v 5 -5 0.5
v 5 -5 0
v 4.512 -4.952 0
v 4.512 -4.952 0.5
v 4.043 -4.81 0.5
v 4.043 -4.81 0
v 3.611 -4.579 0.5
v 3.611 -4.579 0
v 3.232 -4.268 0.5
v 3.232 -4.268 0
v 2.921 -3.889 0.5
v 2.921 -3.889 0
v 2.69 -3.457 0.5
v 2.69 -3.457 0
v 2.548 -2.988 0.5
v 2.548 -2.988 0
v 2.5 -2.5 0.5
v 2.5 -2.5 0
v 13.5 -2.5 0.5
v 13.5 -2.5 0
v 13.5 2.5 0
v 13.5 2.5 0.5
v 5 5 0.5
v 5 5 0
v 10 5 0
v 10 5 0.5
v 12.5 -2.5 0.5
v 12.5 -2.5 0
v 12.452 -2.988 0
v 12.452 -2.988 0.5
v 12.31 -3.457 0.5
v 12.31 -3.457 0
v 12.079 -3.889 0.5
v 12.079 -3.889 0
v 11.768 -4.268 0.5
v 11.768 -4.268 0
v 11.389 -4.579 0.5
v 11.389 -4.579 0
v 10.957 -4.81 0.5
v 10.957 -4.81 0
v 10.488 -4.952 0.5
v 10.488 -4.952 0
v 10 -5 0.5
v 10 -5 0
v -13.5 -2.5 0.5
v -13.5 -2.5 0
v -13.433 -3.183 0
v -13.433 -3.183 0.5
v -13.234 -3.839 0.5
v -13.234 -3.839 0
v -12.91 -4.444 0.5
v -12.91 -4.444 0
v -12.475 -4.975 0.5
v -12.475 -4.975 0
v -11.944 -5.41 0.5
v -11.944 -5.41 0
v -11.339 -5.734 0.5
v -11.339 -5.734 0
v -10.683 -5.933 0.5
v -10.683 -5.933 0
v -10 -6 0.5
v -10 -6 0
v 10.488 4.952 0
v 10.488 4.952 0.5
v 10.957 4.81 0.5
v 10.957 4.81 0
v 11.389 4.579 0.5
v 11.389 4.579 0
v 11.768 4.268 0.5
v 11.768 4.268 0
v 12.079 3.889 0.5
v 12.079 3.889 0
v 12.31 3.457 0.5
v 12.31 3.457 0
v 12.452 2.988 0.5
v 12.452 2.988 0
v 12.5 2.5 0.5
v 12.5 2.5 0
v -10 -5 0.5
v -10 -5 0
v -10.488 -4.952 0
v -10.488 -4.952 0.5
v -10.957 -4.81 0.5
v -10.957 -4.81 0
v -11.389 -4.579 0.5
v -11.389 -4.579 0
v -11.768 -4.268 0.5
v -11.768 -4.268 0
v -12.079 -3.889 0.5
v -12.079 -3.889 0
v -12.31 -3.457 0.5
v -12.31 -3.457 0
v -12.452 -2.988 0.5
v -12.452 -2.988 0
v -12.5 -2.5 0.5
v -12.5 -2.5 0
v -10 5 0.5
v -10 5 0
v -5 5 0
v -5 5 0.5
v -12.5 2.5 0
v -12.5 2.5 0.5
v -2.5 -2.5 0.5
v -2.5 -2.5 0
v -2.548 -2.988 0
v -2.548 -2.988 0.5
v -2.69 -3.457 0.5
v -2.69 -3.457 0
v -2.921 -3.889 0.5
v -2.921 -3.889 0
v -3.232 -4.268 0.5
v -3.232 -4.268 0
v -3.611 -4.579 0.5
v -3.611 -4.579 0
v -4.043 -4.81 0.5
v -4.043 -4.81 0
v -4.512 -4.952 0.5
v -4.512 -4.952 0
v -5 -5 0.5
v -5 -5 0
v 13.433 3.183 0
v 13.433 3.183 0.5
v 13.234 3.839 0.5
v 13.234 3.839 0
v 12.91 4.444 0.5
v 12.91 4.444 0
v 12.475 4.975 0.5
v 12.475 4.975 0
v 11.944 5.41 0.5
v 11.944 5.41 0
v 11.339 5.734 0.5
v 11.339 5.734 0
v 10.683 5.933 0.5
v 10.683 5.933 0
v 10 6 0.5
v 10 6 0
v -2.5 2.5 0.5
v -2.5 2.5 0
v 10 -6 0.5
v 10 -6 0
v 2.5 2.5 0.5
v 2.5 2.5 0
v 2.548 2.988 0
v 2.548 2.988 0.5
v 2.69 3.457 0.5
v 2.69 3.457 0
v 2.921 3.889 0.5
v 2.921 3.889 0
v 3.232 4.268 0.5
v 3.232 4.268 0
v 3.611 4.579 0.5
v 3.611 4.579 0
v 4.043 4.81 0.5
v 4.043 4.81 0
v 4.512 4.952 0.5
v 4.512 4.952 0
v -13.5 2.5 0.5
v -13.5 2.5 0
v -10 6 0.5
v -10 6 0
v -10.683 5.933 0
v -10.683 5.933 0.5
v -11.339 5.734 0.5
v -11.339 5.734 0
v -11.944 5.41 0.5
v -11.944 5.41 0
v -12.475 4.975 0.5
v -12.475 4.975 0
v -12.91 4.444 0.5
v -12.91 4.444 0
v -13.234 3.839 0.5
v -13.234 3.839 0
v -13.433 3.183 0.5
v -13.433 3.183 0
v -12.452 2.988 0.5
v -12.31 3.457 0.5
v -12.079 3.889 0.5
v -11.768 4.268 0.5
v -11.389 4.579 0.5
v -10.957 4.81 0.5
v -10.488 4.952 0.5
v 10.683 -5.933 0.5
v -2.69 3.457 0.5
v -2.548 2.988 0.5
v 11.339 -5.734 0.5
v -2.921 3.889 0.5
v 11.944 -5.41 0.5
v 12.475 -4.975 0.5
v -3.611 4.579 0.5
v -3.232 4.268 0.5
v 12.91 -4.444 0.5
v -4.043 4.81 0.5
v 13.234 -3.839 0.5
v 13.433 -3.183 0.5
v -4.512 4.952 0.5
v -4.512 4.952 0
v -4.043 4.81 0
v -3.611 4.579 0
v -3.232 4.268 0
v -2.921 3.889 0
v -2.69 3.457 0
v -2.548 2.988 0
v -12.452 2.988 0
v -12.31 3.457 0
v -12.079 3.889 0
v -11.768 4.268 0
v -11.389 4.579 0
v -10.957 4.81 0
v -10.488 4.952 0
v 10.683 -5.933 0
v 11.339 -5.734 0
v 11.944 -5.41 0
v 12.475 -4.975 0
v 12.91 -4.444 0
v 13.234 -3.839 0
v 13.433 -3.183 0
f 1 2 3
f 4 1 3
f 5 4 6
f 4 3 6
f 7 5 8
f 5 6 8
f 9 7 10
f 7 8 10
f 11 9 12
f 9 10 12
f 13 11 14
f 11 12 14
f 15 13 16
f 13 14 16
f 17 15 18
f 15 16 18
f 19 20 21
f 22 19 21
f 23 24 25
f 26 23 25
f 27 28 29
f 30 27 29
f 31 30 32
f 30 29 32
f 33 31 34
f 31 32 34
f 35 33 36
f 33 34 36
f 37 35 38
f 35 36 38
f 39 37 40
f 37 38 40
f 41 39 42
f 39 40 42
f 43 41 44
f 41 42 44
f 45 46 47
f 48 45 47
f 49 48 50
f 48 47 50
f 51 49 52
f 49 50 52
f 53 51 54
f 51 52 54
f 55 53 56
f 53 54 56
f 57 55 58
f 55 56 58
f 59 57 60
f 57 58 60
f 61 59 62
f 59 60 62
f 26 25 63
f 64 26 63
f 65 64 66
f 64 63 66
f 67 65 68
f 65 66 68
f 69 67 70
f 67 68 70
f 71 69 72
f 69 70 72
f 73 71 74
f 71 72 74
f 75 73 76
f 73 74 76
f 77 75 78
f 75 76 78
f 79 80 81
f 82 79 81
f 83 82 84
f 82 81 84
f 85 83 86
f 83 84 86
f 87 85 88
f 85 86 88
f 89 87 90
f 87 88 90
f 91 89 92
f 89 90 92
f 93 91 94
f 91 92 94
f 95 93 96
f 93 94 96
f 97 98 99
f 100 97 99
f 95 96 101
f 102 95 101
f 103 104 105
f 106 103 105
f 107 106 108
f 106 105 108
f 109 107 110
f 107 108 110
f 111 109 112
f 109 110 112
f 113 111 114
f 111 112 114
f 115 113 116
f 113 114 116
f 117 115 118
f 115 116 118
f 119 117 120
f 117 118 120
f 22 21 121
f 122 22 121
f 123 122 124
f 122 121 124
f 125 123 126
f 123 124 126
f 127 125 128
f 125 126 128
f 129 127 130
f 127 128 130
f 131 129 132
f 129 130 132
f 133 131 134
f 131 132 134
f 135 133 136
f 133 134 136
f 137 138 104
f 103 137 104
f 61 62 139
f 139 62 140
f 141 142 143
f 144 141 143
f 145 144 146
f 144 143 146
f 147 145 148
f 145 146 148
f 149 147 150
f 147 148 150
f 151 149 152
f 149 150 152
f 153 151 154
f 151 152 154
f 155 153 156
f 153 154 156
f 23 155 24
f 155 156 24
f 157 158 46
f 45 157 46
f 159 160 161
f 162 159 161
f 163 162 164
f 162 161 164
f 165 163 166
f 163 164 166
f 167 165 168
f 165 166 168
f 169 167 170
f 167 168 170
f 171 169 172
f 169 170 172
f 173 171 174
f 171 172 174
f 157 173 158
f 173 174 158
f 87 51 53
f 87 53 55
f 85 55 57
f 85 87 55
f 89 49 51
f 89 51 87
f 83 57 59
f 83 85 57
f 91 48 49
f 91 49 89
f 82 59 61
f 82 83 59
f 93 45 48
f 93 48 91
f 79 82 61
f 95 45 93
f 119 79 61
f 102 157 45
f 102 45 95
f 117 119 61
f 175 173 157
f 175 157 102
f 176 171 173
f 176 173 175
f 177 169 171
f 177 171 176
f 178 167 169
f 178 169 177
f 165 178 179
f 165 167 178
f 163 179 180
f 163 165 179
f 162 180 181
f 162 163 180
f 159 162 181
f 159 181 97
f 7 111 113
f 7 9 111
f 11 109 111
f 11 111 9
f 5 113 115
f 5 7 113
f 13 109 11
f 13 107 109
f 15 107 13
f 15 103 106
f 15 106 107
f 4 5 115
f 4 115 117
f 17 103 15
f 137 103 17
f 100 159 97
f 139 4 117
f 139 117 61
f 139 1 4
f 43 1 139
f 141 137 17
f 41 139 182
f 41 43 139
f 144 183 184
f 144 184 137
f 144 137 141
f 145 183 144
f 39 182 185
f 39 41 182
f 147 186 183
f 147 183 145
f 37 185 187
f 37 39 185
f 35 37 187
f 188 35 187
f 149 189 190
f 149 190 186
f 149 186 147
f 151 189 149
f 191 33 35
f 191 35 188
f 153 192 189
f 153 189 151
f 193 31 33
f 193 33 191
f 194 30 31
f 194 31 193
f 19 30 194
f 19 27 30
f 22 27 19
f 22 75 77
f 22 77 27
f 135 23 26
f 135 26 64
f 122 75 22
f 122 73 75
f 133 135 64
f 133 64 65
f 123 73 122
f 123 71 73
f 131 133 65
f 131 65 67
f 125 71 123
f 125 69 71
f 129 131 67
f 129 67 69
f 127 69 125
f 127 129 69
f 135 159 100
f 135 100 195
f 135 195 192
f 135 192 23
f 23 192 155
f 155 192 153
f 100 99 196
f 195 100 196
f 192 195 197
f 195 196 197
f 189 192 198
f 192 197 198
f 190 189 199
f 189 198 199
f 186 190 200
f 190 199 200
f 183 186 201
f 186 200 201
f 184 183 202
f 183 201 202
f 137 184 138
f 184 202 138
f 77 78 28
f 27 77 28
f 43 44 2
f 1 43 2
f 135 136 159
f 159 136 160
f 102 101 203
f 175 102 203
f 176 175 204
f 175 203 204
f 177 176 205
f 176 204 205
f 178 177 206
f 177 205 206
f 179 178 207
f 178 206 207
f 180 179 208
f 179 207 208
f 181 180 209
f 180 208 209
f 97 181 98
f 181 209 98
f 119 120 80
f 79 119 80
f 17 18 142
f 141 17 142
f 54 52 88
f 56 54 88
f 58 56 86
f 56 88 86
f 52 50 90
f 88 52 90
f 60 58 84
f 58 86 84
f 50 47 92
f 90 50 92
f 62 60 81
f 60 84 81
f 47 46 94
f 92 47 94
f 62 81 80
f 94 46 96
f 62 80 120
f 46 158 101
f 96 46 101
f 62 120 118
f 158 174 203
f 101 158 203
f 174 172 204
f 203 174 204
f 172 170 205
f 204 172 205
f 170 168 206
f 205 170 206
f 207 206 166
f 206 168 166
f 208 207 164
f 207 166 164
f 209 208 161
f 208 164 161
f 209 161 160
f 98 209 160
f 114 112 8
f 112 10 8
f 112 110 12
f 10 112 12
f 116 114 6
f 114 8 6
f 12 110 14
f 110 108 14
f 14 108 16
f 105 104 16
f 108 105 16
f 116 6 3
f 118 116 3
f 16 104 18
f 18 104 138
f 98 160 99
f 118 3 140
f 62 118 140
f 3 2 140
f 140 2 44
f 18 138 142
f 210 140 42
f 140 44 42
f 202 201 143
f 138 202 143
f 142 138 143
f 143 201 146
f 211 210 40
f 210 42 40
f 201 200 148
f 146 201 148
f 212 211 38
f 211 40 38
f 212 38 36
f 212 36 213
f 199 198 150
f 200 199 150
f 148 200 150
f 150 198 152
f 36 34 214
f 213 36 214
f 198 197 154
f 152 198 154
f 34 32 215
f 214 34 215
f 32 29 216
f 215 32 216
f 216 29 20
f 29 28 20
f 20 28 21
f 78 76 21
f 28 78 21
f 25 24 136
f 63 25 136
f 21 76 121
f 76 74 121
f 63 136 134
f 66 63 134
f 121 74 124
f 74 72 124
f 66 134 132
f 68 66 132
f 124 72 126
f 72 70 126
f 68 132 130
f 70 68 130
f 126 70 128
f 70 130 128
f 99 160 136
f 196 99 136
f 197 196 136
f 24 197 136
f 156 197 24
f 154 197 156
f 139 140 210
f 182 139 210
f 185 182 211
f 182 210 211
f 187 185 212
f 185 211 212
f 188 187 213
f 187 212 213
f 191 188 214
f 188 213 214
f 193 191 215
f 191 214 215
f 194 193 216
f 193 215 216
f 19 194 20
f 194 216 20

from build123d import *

# Parameters (mm, degrees)
F1_DEPTH = 0.5


with BuildPart() as f1:
    # F0 (on Top) → F1 (new body)
    with BuildSketch(Plane.XY):
        with BuildLine():
            Line((-13.5, 2.5), (-13.5, 0))
            Line((-13.5, 0), (-13.5, -2.5))
            ThreePointArc((-13.5, -2.5), (-12.474874, -4.974874), (-10, -6))
            Line((-10, -6), (10, -6))
            ThreePointArc((10, -6), (12.474874, -4.974874), (13.5, -2.5))
            Line((13.5, -2.5), (13.5, 2.5))
            ThreePointArc((13.5, 2.5), (12.474874, 4.974874), (10, 6))
            Line((10, 6), (-10, 6))
            ThreePointArc((-10, 6), (-12.474874, 4.974874), (-13.5, 2.5))
        make_face()
        with BuildLine():
            Line((-2.5, 2.5), (-2.5, 0))
            Line((-2.5, 0), (-2.5, -2.5))
            ThreePointArc((-2.5, -2.5), (-3.232233, -4.267767), (-5, -5))
            Line((-5, -5), (-10, -5))
            ThreePointArc((-10, -5), (-11.767767, -4.267767), (-12.5, -2.5))
            Line((-12.5, -2.5), (-12.5, 0))
            Line((-12.5, 0), (-12.5, 2.5))
            ThreePointArc((-12.5, 2.5), (-11.767767, 4.267767), (-10, 5))
            Line((-10, 5), (-5, 5))
            ThreePointArc((-5, 5), (-3.232233, 4.267767), (-2.5, 2.5))
        make_face(mode=Mode.SUBTRACT)
        with BuildLine():
            Line((2.5, -2.5), (2.5, 0))
            Line((2.5, 0), (2.5, 2.5))
            ThreePointArc((2.5, 2.5), (3.232233, 4.267767), (5, 5))
            Line((5, 5), (10, 5))
            ThreePointArc((10, 5), (11.767767, 4.267767), (12.5, 2.5))
            Line((12.5, 2.5), (12.5, -2.5))
            ThreePointArc((12.5, -2.5), (11.767767, -4.267767), (10, -5))
            Line((10, -5), (5, -5))
            ThreePointArc((5, -5), (3.232233, -4.267767), (2.5, -2.5))
        make_face(mode=Mode.SUBTRACT)
    extrude(amount=F1_DEPTH)


solid = f1.part
